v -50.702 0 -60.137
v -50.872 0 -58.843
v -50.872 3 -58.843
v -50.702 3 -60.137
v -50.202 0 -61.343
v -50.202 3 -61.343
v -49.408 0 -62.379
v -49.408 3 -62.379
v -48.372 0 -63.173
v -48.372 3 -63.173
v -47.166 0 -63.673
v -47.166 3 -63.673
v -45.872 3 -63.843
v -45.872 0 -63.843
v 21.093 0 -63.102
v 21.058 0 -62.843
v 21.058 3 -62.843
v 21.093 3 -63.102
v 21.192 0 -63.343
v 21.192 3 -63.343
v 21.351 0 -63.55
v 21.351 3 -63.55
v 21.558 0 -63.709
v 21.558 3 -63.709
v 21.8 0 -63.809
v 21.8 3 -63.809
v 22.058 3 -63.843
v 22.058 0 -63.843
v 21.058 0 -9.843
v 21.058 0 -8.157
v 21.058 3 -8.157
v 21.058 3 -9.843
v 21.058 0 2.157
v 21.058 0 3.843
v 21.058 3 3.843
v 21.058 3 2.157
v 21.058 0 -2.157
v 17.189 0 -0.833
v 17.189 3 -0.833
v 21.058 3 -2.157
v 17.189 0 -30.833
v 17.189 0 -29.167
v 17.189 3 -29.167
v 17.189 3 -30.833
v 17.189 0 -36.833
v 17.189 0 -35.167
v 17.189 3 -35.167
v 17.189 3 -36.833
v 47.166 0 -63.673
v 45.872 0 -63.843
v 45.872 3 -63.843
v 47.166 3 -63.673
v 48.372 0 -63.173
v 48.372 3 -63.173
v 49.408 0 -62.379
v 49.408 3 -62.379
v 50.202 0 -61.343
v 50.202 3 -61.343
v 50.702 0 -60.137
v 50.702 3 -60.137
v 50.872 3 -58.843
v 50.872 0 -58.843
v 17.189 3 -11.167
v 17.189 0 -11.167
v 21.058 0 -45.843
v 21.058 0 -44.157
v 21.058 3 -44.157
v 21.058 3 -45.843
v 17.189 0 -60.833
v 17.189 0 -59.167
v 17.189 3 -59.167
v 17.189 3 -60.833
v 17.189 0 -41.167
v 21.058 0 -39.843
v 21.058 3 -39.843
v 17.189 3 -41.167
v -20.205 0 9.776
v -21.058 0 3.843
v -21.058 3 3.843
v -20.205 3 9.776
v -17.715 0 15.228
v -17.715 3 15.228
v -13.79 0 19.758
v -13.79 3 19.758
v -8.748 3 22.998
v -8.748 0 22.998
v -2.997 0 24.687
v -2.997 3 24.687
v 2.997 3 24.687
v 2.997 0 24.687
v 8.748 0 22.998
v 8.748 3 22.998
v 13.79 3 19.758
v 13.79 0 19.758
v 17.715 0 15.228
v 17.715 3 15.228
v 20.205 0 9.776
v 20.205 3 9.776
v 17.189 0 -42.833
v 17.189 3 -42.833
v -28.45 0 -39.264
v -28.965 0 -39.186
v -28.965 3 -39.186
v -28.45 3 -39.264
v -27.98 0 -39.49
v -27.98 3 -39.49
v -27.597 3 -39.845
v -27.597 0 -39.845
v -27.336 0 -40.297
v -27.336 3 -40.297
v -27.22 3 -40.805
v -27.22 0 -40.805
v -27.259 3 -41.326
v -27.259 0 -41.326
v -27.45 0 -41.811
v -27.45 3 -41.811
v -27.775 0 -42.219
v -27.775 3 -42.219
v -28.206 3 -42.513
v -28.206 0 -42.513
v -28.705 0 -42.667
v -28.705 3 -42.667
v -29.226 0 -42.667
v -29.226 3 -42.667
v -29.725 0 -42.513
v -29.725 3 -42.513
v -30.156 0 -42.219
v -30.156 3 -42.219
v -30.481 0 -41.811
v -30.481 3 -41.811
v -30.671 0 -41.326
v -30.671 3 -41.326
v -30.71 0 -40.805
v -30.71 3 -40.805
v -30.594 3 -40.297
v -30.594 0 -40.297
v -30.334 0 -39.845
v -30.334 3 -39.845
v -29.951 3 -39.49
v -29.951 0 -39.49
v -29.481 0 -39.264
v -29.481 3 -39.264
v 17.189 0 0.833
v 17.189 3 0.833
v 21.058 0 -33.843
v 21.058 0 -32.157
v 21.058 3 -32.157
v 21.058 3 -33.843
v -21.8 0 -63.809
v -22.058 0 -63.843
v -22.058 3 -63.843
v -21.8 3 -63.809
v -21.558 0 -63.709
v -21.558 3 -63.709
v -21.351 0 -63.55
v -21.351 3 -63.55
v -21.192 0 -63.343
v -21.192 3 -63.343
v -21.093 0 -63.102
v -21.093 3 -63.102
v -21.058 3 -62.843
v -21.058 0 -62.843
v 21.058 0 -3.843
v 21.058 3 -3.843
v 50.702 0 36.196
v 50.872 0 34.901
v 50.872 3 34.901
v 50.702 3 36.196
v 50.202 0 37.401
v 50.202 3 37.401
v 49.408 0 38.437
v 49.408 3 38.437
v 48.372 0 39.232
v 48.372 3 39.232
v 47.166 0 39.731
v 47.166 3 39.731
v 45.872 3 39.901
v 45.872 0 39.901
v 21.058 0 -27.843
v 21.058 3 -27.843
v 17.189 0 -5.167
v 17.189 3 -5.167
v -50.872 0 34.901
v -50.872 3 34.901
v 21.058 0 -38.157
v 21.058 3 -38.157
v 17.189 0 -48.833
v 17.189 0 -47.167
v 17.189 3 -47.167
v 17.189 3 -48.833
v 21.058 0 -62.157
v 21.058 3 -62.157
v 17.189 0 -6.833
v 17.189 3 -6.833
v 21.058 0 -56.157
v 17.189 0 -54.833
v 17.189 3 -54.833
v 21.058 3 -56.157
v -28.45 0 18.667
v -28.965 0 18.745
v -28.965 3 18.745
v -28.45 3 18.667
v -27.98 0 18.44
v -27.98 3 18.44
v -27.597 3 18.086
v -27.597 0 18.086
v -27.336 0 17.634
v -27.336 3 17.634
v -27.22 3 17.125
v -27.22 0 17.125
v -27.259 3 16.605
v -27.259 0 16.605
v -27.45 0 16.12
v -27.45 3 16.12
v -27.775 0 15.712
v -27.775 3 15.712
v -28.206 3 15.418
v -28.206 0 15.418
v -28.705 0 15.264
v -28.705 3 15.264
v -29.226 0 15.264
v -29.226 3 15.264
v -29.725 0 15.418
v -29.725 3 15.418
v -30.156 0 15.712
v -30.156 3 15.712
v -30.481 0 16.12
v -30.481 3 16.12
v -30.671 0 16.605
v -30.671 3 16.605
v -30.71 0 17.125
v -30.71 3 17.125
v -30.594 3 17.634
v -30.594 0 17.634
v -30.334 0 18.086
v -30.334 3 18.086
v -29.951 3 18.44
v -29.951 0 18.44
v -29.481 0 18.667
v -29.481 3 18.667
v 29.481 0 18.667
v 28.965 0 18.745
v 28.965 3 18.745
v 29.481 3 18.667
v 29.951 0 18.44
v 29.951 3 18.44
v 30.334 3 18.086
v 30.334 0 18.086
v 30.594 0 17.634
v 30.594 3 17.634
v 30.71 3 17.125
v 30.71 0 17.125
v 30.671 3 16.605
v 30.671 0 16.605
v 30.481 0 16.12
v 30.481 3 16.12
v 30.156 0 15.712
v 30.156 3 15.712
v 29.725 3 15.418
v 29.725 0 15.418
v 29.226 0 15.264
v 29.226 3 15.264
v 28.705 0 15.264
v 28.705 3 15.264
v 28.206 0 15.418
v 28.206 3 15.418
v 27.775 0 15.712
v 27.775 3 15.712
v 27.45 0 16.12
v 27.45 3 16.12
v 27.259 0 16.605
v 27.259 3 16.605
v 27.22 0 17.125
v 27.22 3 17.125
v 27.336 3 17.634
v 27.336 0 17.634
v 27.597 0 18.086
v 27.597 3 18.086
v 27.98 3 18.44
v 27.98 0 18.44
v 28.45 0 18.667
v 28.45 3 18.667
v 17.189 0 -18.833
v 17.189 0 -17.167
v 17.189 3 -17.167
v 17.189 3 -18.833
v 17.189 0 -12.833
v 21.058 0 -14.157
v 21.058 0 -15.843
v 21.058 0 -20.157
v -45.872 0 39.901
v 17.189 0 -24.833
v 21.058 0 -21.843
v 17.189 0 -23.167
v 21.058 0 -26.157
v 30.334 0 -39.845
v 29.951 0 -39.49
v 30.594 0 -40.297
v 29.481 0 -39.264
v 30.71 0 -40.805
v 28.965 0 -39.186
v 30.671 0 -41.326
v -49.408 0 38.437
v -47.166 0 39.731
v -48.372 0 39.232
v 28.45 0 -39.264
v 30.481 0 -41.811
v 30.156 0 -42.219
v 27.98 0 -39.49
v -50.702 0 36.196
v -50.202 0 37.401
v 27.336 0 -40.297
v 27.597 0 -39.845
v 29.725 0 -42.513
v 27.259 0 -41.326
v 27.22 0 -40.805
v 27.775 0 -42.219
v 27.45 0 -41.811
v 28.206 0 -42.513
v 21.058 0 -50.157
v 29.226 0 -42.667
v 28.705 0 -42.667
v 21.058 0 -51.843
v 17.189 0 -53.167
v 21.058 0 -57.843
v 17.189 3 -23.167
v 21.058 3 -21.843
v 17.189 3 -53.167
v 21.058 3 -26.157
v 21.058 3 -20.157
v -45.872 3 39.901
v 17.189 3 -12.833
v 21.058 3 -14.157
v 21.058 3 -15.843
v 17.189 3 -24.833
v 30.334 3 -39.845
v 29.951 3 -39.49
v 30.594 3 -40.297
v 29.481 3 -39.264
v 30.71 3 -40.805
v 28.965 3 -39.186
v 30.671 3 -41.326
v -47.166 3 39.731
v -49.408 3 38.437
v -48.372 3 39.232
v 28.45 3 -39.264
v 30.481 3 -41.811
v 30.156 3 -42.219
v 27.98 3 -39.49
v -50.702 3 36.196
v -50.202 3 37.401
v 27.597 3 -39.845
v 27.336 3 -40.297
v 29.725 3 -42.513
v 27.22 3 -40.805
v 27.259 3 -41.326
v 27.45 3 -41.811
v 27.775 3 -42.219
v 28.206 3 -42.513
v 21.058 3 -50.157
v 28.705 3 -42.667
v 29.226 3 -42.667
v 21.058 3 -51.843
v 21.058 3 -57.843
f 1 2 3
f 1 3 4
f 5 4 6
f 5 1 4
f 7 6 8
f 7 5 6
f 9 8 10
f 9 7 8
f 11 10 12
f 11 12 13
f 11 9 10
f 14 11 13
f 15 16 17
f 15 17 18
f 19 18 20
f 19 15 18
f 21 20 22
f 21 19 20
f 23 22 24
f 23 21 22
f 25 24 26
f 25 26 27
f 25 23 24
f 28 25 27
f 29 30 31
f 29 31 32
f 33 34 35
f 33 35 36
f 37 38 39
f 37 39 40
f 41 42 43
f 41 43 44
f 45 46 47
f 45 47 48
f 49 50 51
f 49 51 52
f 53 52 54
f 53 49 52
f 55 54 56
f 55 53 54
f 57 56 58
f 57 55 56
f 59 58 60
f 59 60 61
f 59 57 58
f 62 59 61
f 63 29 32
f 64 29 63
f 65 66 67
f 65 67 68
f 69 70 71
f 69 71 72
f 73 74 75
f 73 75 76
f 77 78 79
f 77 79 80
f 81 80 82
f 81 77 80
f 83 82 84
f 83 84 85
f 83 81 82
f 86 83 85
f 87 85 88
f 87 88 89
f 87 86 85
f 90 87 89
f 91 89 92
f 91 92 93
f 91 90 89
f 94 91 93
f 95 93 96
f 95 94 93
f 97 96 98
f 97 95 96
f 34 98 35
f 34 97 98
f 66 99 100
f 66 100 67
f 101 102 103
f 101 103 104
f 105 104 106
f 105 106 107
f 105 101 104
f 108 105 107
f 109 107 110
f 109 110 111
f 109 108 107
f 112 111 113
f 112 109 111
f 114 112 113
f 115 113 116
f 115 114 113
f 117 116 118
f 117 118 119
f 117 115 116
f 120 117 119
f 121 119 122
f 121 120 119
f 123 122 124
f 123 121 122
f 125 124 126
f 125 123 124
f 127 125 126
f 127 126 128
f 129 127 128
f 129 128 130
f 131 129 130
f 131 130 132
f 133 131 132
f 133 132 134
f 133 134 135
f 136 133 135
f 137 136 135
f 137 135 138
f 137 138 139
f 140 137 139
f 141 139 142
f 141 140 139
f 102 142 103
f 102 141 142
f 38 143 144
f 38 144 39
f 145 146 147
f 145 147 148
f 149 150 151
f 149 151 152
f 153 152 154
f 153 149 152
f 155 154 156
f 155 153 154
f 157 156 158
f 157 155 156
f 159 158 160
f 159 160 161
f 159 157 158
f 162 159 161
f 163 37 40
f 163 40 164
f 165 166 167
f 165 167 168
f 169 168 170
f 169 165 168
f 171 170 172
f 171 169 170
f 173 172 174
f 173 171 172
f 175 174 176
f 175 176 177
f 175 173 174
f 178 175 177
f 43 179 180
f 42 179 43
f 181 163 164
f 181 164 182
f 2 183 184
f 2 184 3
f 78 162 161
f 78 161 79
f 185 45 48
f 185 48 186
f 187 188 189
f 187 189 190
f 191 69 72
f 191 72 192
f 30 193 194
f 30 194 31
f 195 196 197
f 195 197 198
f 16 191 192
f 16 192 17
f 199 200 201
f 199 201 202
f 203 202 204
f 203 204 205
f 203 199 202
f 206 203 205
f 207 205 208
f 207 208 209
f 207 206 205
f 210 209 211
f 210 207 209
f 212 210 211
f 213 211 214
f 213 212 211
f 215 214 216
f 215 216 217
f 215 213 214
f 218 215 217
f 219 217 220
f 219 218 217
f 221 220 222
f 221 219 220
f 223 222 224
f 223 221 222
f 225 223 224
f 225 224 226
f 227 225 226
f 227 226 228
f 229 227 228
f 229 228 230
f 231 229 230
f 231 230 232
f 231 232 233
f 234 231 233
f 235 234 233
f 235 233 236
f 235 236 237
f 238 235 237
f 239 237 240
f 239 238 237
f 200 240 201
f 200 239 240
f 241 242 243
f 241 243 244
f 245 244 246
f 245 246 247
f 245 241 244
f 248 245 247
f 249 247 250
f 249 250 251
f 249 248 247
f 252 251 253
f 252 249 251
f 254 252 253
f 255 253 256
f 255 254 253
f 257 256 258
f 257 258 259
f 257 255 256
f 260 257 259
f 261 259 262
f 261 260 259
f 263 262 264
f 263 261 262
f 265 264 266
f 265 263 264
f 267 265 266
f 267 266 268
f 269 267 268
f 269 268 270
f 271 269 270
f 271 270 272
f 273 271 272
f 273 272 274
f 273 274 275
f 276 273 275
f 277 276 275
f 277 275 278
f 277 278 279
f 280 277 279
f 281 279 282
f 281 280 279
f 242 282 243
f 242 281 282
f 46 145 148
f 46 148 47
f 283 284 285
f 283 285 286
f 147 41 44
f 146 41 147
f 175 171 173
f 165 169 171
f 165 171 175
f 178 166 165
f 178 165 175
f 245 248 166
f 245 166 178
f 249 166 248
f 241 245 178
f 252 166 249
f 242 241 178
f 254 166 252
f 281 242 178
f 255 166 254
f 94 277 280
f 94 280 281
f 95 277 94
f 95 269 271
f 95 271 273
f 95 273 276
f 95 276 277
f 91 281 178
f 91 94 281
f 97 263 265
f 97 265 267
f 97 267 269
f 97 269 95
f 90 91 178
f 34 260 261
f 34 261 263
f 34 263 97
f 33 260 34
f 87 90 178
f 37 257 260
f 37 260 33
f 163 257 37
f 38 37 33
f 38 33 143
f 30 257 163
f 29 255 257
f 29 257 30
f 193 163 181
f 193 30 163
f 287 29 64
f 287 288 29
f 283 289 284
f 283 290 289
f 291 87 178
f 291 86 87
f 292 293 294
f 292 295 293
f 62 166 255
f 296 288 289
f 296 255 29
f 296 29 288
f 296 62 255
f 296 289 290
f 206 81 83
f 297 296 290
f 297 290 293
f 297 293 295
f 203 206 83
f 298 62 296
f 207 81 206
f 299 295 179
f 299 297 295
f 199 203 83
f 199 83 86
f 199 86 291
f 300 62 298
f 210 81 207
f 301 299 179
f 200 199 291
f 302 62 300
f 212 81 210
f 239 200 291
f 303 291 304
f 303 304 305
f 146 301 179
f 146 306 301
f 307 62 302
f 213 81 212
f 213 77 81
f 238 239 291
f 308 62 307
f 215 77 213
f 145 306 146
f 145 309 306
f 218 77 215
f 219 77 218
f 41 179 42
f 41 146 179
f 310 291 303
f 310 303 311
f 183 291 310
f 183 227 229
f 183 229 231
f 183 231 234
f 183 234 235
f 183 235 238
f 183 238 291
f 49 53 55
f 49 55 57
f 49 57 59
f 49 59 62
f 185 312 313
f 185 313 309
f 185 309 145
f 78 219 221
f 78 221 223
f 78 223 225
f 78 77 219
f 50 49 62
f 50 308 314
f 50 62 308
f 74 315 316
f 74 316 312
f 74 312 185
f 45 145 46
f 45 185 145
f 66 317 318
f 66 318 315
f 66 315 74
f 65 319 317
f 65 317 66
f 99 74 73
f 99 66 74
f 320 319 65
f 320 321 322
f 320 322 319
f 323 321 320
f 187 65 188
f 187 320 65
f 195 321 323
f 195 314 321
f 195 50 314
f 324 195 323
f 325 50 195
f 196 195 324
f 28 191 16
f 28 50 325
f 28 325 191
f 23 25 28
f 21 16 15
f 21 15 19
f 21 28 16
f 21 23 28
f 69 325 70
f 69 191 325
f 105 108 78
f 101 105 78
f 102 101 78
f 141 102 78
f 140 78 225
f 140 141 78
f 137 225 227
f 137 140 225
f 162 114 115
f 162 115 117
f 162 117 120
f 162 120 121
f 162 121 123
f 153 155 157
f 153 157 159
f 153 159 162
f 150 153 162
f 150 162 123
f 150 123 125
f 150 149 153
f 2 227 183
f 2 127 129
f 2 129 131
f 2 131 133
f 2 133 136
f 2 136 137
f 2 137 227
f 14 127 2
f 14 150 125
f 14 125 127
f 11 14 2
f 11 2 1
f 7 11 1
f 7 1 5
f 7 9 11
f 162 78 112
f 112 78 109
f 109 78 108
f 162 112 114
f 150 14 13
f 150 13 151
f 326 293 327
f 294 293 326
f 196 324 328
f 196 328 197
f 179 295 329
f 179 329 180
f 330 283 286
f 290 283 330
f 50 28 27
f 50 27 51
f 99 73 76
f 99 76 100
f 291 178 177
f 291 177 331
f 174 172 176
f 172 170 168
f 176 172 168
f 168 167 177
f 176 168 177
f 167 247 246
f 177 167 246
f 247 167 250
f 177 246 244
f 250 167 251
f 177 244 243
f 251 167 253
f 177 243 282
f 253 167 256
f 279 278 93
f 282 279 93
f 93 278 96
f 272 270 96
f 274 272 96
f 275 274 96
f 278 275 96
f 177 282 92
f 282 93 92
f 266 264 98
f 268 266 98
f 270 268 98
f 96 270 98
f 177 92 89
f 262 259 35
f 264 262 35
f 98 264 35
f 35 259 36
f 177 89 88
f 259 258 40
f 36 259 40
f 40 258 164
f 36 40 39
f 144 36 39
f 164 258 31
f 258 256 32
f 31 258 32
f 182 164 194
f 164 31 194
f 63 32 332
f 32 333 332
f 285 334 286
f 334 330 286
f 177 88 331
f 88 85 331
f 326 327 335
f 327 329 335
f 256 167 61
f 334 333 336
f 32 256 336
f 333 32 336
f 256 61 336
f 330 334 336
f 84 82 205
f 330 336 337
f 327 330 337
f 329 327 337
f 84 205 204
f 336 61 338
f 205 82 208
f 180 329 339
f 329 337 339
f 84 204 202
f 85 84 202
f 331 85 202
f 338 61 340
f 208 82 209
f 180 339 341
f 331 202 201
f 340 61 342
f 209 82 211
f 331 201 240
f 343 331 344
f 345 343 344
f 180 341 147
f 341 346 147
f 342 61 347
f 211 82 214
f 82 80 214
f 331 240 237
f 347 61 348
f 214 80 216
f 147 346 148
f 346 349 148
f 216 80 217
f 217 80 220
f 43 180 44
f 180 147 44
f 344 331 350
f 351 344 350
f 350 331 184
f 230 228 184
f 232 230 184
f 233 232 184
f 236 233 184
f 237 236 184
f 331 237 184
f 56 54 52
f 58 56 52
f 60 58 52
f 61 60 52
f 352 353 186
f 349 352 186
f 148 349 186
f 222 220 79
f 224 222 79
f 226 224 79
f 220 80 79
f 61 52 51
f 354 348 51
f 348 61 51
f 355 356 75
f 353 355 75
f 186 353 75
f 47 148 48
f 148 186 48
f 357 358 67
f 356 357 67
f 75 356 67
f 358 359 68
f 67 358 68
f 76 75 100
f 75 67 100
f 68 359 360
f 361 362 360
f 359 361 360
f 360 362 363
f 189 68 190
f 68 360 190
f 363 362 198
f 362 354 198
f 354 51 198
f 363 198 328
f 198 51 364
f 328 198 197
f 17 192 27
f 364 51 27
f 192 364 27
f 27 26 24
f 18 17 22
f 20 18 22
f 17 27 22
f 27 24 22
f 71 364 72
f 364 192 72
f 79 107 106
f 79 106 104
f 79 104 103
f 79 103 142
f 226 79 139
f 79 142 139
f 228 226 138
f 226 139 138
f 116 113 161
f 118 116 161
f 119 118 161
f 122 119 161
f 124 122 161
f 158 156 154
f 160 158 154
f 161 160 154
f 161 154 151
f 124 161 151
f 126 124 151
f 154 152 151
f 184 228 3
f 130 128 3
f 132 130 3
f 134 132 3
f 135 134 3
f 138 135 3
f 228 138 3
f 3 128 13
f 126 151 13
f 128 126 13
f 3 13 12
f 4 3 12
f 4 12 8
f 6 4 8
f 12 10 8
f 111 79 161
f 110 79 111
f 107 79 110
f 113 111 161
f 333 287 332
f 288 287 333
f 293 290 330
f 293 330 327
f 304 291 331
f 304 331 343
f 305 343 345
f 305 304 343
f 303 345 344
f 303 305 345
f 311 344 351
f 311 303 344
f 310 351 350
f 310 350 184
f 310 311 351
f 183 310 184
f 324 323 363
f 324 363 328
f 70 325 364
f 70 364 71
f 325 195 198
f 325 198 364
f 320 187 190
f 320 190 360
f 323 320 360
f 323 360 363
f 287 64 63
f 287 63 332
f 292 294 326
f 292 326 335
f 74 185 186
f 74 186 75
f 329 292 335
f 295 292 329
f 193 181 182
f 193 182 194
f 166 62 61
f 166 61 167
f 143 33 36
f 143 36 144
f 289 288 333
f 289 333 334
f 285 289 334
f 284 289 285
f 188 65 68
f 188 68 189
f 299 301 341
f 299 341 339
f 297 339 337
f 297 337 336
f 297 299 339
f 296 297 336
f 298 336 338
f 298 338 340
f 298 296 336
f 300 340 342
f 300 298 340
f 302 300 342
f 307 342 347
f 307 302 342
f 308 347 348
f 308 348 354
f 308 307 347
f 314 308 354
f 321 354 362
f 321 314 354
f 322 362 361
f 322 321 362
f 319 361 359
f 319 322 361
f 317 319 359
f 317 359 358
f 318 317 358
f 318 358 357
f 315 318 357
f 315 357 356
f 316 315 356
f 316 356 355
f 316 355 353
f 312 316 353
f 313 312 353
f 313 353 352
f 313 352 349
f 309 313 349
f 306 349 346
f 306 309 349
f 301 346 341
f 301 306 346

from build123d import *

# Parameters (mm, degrees)
SKETCH1_R           = 1.75
BOSS_EXTRUDE1_DEPTH = 3


with BuildPart() as part:
    # Sketch1 → Boss-Extrude1 (new body)
    with BuildSketch(Plane(origin=(0, 0, 0), x_dir=(1, 0, 0), z_dir=(0, 1, 0))):
        with BuildLine():
            Line((21.058452488, 3.842990858), (17.188733854, 5.16651258))
            Line((17.188733854, 5.16651258), (17.188733854, 6.83348742))
            Line((17.188733854, 6.83348742), (21.058452488, 8.157009142))
            Line((21.058452488, 8.157009142), (21.058452488, 9.842990858))
            Line((21.058452488, 9.842990858), (17.188733854, 11.16651258))
            Line((17.188733854, 11.16651258), (17.188733854, 12.83348742))
            Line((17.188733854, 12.83348742), (21.058452488, 14.157009142))
            Line((21.058452488, 14.157009142), (21.058452488, 15.842990858))
            Line((21.058452488, 15.842990858), (17.188733854, 17.16651258))
            Line((17.188733854, 17.16651258), (17.188733854, 18.83348742))
            Line((17.188733854, 18.83348742), (21.058452488, 20.157009142))
            Line((21.058452488, 20.157009142), (21.058452488, 21.842990858))
            Line((21.058452488, 21.842990858), (17.188733854, 23.16651258))
            Line((17.188733854, 23.16651258), (17.188733854, 24.83348742))
            Line((17.188733854, 24.83348742), (21.058452488, 26.157009142))
            Line((21.058452488, 26.157009142), (21.058452488, 27.842990858))
            Line((21.058452488, 27.842990858), (17.188733854, 29.16651258))
            Line((17.188733854, 29.16651258), (17.188733854, 30.83348742))
            Line((17.188733854, 30.83348742), (21.058452488, 32.157009142))
            Line((21.058452488, 32.157009142), (21.058452488, 33.842990858))
            Line((21.058452488, 33.842990858), (17.188733854, 35.16651258))
            Line((17.188733854, 35.16651258), (17.188733854, 36.83348742))
            Line((17.188733854, 36.83348742), (21.058452488, 38.157009142))
            Line((21.058452488, 38.157009142), (21.058452488, 39.842990858))
            Line((21.058452488, 39.842990858), (17.188733854, 41.16651258))
            Line((17.188733854, 41.16651258), (17.188733854, 42.83348742))
            Line((17.188733854, 42.83348742), (21.058452488, 44.157009142))
            Line((21.058452488, 44.157009142), (21.058452488, 45.842990858))
            Line((21.058452488, 45.842990858), (17.188733854, 47.16651258))
            Line((17.188733854, 47.16651258), (17.188733854, 48.83348742))
            Line((17.188733854, 48.83348742), (21.058452488, 50.157009142))
            Line((21.058452488, 50.157009142), (21.058452488, 51.842990858))
            Line((21.058452488, 51.842990858), (17.188733854, 53.16651258))
            Line((17.188733854, 53.16651258), (17.188733854, 54.83348742))
            Line((17.188733854, 54.83348742), (21.058452488, 56.157009142))
            Line((21.058452488, 56.157009142), (21.058452488, 57.842990858))
            Line((21.058452488, 57.842990858), (17.188733854, 59.16651258))
            Line((17.188733854, 59.16651258), (17.188733854, 60.83348742))
            Line((17.188733854, 60.83348742), (21.058452488, 62.157009142))
            Line((21.058452488, 62.157009142), (21.058452488, 62.842990858))
            ThreePointArc((21.058452488, 62.842990858), (21.351345707, 63.550097639), (22.058452488, 63.842990858))
            Line((22.058452488, 63.842990858), (45.872217102, 63.842990858))
            ThreePointArc((45.872217102, 63.842990858), (49.407751008, 62.378524764), (50.872217102, 58.842990858))
            Line((50.872217102, 58.842990858), (50.872217102, -34.901443346))
            ThreePointArc((50.872217102, -34.901443346), (49.407751008, -38.436977252), (45.872217102, -39.901443346))
            Line((45.872217102, -39.901443346), (-45.872217102, -39.901443346))
            ThreePointArc((-45.872217102, -39.901443346), (-49.407751008, -38.436977252), (-50.872217102, -34.901443346))
            Line((-50.872217102, -34.901443346), (-50.872217102, 58.842990858))
            ThreePointArc((-50.872217102, 58.842990858), (-49.407751008, 62.378524764), (-45.872217102, 63.842990858))
            Line((-45.872217102, 63.842990858), (-22.058452488, 63.842990858))
            ThreePointArc((-22.058452488, 63.842990858), (-21.351345707, 63.550097639), (-21.058452488, 62.842990858))
            Line((-21.058452488, 62.842990858), (-21.058452488, -3.842990858))
            ThreePointArc((-21.058452488, -3.842990858), (0, -24.901443346), (21.058452488, -3.842990858))
            Line((21.058452488, -3.842990858), (21.058452488, -2.157009142))
            Line((21.058452488, -2.157009142), (17.188733854, -0.83348742))
            Line((17.188733854, -0.83348742), (17.188733854, 0.83348742))
            Line((17.188733854, 0.83348742), (21.058452488, 2.157009142))
            Line((21.058452488, 2.157009142), (21.058452488, 3.842990858))
        make_face()
        with Locations(Location((28.965334795, -16.994561039, 0), (0, 0, 270))):
            Circle(SKETCH1_R, mode=Mode.SUBTRACT)
        with Locations(Location((-28.965334795, -16.994561039, 0), (0, 0, 270))):
            Circle(SKETCH1_R, mode=Mode.SUBTRACT)
        with Locations(Location((-28.965334795, 40.936108551, 0), (0, 0, 270))):
            Circle(SKETCH1_R, mode=Mode.SUBTRACT)
        with Locations(Location((28.965334795, 40.936108551, 0), (0, 0, 270))):
            Circle(SKETCH1_R, mode=Mode.SUBTRACT)
    extrude(amount=BOSS_EXTRUDE1_DEPTH)


solid = part.part
